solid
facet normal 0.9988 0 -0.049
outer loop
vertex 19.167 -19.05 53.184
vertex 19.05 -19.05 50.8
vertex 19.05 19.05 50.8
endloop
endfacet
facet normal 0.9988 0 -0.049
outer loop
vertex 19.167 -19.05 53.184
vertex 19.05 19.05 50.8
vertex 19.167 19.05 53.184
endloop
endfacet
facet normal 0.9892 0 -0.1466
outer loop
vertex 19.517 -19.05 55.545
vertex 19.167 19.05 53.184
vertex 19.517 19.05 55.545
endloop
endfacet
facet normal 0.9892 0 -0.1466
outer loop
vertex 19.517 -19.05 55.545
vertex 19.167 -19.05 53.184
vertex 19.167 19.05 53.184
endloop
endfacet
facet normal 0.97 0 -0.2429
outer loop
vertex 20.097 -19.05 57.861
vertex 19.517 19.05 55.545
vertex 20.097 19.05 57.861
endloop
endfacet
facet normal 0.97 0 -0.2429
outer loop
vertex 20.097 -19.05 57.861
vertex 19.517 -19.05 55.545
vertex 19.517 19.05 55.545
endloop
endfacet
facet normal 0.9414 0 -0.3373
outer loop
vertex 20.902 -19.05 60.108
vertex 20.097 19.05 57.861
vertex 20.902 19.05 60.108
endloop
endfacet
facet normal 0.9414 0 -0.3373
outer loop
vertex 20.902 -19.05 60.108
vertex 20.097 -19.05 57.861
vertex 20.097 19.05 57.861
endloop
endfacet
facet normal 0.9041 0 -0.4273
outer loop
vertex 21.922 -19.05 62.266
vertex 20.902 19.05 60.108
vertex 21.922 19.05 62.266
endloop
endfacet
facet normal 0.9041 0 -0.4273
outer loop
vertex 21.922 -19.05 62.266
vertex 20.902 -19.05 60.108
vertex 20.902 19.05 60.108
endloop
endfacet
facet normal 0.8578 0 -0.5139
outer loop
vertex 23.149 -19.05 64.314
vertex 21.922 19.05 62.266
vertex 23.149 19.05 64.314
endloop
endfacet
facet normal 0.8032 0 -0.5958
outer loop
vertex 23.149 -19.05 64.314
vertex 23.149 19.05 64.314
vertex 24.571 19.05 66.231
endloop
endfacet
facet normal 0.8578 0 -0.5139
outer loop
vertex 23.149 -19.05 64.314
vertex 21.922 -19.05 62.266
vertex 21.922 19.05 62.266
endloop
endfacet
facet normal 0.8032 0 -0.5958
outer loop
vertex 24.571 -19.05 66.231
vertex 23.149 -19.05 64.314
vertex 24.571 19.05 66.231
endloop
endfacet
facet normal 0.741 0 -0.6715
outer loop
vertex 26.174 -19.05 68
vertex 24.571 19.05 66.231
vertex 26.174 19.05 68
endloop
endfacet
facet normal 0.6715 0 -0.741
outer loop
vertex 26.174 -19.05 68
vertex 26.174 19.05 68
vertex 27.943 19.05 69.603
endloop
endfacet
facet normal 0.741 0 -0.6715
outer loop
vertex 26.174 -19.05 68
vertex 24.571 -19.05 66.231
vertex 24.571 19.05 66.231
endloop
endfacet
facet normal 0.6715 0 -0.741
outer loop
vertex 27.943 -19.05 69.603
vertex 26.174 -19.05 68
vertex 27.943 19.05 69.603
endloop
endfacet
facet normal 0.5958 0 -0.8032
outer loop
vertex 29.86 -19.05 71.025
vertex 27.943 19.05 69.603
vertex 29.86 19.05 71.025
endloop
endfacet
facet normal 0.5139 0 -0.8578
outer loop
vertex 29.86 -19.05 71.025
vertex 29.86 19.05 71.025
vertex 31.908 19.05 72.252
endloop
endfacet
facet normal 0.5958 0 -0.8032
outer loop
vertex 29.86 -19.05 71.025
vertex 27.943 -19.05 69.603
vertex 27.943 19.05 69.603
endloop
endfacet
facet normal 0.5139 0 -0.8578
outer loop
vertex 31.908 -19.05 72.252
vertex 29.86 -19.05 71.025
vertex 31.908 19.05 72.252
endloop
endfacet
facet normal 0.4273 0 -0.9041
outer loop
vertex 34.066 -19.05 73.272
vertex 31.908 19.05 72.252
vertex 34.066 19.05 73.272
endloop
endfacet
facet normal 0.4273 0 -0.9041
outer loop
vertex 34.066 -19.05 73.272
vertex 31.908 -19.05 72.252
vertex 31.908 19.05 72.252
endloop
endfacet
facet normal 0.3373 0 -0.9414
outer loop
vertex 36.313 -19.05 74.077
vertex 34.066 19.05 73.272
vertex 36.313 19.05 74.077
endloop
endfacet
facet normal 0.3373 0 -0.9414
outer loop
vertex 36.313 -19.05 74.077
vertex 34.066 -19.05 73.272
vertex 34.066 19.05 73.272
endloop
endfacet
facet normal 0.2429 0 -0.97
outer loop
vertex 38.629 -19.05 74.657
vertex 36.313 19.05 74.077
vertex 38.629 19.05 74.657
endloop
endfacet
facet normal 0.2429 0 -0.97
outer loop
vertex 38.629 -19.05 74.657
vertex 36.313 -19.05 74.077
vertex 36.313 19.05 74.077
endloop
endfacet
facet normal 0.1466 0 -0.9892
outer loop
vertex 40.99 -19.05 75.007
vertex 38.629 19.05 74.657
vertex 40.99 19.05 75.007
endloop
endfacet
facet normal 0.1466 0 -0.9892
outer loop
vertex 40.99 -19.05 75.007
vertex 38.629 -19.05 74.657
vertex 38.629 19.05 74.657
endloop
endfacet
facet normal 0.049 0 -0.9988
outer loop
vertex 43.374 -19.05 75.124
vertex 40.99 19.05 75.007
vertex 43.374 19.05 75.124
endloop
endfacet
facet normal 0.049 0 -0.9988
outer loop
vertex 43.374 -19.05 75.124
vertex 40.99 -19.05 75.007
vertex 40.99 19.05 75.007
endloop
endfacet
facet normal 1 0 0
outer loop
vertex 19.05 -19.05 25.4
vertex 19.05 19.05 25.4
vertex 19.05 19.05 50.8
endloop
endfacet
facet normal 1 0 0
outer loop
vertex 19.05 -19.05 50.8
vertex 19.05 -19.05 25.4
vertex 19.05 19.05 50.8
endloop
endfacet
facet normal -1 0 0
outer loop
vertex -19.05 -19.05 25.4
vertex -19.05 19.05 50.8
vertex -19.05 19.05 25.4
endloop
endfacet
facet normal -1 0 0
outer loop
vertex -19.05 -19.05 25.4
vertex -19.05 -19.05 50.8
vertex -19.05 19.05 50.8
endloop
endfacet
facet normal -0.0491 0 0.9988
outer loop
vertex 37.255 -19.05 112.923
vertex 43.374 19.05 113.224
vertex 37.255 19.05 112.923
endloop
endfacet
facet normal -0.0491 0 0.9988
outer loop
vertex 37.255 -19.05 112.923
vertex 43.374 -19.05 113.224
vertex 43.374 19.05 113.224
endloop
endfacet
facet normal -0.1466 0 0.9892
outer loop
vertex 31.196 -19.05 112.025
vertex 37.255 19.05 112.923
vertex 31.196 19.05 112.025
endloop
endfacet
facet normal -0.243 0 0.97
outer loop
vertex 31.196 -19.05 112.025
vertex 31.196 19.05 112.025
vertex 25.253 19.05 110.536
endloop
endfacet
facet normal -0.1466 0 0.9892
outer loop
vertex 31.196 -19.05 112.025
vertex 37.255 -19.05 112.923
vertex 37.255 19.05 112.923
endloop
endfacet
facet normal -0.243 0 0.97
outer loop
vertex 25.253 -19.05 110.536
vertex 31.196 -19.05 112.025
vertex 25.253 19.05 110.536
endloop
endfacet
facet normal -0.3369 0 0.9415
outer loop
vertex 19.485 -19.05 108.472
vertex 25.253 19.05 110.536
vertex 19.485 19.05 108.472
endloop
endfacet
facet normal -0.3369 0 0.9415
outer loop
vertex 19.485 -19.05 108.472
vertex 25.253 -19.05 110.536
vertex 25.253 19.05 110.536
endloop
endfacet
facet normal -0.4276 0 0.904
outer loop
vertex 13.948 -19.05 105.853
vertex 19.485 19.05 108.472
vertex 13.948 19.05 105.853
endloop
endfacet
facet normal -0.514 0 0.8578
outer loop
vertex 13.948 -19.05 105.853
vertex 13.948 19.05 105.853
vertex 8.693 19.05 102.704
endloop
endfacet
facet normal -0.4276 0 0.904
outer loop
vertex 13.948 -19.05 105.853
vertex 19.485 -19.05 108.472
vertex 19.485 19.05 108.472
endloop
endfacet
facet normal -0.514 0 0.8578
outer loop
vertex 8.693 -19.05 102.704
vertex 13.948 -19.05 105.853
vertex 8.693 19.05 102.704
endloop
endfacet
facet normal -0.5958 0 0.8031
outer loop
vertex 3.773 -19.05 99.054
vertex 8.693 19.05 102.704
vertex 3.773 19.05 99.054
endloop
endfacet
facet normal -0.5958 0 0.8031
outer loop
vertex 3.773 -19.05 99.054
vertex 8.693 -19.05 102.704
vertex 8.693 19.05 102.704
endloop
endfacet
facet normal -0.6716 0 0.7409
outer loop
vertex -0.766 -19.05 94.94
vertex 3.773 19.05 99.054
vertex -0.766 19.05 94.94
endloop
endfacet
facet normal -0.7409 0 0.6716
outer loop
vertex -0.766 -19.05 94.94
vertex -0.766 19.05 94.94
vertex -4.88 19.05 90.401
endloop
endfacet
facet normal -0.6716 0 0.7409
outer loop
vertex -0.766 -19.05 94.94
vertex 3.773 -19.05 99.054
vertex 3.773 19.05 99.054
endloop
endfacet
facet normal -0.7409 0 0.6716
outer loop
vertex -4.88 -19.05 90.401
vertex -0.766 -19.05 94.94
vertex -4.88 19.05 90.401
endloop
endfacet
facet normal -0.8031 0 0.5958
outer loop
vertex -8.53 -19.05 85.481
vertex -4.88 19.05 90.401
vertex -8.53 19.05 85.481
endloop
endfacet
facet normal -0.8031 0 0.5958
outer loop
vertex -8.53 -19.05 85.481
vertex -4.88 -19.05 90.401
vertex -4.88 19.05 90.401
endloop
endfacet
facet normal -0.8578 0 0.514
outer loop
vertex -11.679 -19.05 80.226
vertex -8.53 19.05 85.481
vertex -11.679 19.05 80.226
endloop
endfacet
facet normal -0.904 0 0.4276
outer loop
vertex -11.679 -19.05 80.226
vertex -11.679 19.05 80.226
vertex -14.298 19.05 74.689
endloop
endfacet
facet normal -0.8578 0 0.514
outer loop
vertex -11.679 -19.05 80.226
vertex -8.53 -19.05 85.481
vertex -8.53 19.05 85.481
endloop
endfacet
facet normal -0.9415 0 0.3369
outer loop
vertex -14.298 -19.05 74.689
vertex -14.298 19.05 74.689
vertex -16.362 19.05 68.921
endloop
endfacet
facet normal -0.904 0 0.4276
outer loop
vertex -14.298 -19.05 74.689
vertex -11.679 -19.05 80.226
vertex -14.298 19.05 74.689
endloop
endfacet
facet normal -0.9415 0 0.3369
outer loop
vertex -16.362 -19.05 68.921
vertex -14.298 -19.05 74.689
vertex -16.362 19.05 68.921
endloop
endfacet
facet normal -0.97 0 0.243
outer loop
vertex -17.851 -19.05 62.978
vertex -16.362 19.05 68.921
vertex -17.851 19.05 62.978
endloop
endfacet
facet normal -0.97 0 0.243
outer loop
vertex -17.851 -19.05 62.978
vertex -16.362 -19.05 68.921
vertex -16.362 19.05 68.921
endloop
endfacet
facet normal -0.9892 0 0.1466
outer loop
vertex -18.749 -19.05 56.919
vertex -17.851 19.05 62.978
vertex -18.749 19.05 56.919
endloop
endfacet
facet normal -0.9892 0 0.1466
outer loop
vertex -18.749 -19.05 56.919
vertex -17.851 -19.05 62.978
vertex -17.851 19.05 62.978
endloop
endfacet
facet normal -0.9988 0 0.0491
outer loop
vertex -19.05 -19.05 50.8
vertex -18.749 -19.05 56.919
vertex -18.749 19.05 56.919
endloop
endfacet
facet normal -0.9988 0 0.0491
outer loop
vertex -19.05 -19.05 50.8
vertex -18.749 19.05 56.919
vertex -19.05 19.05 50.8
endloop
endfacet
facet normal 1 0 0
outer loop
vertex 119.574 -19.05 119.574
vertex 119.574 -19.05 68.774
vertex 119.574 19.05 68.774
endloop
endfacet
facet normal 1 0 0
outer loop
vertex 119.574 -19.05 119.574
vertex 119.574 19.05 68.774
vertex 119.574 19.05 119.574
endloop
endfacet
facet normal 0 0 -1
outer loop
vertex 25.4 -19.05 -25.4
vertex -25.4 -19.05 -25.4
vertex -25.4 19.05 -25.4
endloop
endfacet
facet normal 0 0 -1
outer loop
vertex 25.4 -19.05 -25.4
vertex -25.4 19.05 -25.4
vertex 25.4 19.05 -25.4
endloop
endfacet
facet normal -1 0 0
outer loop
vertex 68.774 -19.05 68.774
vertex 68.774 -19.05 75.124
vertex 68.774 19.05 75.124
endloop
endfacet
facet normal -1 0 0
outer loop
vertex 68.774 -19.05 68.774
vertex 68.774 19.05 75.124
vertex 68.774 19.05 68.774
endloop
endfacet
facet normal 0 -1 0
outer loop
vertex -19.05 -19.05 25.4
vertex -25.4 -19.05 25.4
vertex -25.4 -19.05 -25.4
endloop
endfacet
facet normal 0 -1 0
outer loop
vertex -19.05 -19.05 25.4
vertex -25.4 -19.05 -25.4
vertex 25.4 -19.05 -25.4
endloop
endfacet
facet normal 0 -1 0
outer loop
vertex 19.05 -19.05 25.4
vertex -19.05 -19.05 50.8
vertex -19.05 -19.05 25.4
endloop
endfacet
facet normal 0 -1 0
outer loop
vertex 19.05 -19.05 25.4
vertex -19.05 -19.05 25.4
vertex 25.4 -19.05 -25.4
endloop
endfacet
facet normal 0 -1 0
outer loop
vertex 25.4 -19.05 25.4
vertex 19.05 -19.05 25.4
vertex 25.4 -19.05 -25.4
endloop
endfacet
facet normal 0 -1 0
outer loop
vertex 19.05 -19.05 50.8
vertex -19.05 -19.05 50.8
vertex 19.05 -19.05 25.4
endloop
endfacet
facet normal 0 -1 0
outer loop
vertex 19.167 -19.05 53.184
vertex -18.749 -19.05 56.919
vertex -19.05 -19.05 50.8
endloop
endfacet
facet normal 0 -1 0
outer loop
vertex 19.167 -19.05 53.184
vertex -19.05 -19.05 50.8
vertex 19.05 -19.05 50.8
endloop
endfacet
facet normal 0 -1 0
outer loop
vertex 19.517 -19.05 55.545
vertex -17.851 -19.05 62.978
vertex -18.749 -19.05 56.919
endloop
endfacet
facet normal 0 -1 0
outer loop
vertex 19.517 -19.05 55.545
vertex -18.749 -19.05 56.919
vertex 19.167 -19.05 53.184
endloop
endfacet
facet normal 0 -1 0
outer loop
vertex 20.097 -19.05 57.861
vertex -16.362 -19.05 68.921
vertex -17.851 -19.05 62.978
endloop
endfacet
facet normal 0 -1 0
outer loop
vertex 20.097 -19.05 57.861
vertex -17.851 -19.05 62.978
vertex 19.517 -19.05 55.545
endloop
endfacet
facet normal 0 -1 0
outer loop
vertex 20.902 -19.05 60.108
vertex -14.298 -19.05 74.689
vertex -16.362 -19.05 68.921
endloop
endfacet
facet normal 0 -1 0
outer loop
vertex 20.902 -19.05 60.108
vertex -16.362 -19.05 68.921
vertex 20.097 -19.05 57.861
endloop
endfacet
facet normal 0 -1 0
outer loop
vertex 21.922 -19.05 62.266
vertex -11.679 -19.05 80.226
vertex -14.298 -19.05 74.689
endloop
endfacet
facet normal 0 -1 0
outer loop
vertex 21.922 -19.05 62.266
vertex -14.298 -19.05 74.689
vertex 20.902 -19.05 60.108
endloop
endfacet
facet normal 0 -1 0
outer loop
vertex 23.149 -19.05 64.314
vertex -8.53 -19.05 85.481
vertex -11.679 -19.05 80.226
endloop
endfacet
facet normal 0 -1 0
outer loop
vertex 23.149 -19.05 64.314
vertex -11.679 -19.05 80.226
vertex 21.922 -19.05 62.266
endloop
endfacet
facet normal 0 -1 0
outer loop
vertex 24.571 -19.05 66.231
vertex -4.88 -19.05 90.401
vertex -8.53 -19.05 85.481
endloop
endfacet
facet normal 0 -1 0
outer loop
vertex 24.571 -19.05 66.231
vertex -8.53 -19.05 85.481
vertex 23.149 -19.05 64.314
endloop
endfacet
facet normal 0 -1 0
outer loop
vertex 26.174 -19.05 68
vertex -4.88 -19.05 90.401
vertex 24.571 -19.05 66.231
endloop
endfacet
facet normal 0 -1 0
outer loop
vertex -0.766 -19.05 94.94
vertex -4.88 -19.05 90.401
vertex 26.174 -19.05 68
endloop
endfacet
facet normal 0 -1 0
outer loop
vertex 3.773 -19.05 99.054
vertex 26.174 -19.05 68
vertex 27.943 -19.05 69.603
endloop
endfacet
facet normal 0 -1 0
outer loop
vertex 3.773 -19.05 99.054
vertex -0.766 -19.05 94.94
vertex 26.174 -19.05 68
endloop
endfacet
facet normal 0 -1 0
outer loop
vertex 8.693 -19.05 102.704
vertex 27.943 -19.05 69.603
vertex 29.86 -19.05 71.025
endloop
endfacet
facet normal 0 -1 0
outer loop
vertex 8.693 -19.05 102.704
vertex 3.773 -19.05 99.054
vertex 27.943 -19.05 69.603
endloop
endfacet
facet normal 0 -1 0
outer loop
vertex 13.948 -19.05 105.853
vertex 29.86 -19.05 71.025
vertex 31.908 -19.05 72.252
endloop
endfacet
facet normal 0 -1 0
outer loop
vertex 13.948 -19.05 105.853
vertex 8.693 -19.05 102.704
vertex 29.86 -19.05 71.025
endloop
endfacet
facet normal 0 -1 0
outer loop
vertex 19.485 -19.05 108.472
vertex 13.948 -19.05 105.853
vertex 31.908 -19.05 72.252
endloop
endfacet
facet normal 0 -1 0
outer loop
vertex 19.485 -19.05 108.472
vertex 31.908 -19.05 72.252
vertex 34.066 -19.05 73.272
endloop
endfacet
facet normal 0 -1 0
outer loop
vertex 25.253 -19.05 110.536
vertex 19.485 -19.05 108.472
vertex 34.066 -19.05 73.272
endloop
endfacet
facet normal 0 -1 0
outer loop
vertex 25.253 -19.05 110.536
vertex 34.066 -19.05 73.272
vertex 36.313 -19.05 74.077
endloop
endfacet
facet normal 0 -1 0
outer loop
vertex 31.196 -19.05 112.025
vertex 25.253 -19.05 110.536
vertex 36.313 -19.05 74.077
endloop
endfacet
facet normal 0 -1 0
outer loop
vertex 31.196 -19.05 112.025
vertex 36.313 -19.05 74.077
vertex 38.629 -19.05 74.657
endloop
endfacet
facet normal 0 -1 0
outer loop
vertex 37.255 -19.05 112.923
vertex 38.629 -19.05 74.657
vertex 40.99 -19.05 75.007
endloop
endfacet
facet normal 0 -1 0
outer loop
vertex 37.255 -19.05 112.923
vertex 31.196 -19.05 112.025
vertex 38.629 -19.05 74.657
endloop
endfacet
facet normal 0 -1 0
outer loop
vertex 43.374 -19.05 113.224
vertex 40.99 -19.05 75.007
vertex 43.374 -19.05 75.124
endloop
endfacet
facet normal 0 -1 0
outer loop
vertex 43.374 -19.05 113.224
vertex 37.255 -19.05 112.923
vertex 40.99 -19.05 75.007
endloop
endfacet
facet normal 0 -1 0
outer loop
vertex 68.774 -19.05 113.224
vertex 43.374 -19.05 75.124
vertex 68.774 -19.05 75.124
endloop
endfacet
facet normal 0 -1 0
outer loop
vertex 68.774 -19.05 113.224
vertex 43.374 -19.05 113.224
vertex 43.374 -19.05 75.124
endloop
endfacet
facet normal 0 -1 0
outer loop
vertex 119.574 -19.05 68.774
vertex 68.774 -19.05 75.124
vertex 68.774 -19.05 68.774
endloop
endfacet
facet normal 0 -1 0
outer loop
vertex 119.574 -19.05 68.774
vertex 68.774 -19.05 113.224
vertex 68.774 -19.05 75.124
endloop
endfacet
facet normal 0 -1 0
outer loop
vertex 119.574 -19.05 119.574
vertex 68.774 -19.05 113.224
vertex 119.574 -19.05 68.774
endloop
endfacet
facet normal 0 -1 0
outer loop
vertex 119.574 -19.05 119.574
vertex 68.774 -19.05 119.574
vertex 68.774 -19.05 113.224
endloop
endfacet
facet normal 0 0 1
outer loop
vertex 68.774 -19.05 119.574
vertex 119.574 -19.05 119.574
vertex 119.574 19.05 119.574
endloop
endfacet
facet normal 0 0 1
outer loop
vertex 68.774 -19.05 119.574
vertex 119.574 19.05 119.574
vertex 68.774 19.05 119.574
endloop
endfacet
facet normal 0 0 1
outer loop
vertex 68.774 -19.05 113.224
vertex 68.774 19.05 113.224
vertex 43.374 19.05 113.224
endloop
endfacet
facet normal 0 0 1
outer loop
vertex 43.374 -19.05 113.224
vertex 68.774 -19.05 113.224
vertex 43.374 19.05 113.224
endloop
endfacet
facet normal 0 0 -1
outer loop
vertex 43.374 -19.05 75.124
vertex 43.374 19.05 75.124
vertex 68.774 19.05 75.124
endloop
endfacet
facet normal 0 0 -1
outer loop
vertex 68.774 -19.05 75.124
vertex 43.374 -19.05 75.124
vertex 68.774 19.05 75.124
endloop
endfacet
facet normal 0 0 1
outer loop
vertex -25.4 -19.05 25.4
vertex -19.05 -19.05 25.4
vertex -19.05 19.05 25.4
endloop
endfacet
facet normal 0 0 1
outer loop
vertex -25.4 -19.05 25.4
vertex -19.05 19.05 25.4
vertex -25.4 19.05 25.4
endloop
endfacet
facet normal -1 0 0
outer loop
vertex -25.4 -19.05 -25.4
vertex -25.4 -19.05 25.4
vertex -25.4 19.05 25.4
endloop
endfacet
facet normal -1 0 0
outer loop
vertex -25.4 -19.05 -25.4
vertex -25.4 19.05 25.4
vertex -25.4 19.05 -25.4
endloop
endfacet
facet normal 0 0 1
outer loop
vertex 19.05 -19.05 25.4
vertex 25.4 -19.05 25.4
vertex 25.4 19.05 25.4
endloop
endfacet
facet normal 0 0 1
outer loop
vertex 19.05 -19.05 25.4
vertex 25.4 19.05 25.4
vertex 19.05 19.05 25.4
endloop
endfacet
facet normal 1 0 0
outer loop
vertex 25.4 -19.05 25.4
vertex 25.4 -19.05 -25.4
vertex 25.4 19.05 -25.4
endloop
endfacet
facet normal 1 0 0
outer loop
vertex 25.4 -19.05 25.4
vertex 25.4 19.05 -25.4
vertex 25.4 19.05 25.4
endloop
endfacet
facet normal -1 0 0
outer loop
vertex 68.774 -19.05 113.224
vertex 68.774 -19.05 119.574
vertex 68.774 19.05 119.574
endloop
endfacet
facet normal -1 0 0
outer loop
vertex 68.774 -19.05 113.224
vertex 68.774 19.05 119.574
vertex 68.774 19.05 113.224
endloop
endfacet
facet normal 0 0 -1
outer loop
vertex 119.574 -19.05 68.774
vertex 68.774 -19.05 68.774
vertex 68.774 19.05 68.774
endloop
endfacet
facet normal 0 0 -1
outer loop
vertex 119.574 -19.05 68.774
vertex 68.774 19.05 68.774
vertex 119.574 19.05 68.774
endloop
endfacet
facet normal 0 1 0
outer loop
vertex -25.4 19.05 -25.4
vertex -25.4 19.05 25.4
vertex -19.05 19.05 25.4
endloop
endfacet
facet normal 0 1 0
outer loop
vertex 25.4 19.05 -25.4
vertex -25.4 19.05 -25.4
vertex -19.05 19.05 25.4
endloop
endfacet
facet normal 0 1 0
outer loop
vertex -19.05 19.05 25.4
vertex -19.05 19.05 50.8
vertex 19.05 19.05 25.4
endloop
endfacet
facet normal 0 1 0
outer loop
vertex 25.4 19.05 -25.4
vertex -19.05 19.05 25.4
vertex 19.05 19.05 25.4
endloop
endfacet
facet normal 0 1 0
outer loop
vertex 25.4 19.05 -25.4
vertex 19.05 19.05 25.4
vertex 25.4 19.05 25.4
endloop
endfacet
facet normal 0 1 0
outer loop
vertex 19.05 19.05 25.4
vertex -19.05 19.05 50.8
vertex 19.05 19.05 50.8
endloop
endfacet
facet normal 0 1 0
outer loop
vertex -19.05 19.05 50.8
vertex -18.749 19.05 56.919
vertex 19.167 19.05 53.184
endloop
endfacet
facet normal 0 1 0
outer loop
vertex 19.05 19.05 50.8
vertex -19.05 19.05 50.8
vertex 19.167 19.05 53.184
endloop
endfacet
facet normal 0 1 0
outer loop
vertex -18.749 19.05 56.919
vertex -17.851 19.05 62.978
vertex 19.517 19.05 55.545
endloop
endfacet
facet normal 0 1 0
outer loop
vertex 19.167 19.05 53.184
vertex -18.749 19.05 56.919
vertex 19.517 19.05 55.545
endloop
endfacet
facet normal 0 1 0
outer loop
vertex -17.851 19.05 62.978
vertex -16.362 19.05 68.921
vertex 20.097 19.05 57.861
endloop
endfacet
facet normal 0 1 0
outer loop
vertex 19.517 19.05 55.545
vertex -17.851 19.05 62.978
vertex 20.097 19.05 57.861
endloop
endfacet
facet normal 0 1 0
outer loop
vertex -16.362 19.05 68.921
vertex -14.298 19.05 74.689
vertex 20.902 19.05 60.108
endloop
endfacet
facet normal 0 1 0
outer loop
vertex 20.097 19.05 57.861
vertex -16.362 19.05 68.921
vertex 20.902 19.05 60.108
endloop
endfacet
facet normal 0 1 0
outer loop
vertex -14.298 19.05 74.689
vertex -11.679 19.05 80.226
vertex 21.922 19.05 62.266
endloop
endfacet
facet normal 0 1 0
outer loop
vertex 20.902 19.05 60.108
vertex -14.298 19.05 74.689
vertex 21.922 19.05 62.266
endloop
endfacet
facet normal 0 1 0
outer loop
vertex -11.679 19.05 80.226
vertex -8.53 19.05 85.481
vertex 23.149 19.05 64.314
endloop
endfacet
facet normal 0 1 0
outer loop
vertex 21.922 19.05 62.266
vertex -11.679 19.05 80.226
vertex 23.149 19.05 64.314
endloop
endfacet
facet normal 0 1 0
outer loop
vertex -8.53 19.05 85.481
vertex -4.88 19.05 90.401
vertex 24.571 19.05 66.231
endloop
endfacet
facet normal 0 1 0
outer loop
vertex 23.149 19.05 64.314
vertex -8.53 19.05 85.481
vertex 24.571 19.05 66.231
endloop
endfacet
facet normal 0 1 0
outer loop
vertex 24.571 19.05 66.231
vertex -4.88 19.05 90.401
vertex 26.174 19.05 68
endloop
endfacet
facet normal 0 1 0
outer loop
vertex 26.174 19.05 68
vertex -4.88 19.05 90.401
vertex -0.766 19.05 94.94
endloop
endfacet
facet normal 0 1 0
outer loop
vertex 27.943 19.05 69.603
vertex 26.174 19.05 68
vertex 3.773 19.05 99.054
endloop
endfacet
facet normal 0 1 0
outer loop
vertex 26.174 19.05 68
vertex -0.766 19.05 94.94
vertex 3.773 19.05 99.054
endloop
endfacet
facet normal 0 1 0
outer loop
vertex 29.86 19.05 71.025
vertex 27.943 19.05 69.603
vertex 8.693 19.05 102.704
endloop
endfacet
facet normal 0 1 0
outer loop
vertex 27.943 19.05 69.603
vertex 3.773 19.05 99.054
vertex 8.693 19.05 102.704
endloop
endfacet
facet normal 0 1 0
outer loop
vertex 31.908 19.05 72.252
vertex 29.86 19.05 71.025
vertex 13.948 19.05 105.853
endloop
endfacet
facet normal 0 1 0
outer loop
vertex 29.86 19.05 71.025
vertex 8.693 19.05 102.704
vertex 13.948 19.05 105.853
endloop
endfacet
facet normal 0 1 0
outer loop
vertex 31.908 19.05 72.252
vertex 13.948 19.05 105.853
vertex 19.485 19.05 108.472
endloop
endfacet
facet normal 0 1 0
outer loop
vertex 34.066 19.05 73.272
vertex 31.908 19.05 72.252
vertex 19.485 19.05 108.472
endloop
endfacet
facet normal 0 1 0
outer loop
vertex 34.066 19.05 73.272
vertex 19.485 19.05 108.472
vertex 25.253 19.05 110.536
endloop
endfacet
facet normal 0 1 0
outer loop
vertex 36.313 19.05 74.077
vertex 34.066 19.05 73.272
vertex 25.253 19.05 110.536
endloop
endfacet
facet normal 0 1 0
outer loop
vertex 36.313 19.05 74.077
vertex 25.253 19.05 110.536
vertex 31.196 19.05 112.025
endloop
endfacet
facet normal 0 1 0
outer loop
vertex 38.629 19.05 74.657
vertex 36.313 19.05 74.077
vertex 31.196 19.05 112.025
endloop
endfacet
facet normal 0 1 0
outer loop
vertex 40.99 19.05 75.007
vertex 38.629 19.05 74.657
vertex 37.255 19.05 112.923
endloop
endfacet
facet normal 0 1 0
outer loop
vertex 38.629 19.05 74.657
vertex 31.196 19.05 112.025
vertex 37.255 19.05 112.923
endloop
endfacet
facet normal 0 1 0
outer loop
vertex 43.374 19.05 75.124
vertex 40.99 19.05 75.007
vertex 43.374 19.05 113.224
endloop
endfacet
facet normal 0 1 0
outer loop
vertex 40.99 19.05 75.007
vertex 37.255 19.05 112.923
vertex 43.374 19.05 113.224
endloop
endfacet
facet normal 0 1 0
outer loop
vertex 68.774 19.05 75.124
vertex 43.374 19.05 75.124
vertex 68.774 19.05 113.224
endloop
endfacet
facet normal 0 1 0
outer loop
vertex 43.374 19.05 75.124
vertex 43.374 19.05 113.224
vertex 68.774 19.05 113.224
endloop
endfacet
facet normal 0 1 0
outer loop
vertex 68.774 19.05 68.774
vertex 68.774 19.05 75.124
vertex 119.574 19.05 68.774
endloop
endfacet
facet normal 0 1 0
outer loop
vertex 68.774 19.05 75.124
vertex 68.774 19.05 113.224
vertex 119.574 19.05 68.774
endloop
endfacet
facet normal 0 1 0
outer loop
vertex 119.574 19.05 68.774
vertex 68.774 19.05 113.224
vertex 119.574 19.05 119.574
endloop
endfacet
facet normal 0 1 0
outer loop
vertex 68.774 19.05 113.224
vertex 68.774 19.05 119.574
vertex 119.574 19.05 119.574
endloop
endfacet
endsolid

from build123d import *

# Parameters (mm, degrees)
F1_DEPTH = 19.05


# Not quite as in the source:
# - a feature of the source that left no trace in its solid (it failed there, or was rolled back) is left out


with BuildPart() as f1:
    # F0 (on Front) → F1 (new body, symmetric)
    with BuildSketch(Plane.XZ):
        with BuildLine():
            Line((-19.05, 50.8), (-19.05, 25.4))
            Line((-19.05, 25.4), (19.05, 25.4))
            Line((19.05, 25.4), (19.05, 50.8))
            ThreePointArc((19.05, 50.8), (26.174342016, 67.9996831179), (43.3740251338, 75.1240251338))
            Line((43.3740251338, 75.1240251338), (68.7740251338, 75.1240251338))
            Line((68.7740251338, 75.1240251338), (68.7740251338, 113.2240251338))
            Line((68.7740251338, 113.2240251338), (43.3740251338, 113.2240251338))
            ThreePointArc((43.3740251338, 113.2240251338), (-0.7664263473, 94.9404514811), (-19.05, 50.8))
        make_face()
        Polygon((-19.05, 25.4), (-25.4, 25.4), (-25.4, -25.4), (25.4, -25.4), (25.4, 25.4), (19.05, 25.4), align=None)
        Polygon((68.7740251338, 119.5740251338), (68.7740251338, 113.2240251338), (68.7740251338, 75.1240251338), (68.7740251338, 68.7740251338), (119.5740251338, 68.7740251338), (119.5740251338, 119.5740251338), align=None)
    extrude(amount=F1_DEPTH, both=True)


solid = f1.part
